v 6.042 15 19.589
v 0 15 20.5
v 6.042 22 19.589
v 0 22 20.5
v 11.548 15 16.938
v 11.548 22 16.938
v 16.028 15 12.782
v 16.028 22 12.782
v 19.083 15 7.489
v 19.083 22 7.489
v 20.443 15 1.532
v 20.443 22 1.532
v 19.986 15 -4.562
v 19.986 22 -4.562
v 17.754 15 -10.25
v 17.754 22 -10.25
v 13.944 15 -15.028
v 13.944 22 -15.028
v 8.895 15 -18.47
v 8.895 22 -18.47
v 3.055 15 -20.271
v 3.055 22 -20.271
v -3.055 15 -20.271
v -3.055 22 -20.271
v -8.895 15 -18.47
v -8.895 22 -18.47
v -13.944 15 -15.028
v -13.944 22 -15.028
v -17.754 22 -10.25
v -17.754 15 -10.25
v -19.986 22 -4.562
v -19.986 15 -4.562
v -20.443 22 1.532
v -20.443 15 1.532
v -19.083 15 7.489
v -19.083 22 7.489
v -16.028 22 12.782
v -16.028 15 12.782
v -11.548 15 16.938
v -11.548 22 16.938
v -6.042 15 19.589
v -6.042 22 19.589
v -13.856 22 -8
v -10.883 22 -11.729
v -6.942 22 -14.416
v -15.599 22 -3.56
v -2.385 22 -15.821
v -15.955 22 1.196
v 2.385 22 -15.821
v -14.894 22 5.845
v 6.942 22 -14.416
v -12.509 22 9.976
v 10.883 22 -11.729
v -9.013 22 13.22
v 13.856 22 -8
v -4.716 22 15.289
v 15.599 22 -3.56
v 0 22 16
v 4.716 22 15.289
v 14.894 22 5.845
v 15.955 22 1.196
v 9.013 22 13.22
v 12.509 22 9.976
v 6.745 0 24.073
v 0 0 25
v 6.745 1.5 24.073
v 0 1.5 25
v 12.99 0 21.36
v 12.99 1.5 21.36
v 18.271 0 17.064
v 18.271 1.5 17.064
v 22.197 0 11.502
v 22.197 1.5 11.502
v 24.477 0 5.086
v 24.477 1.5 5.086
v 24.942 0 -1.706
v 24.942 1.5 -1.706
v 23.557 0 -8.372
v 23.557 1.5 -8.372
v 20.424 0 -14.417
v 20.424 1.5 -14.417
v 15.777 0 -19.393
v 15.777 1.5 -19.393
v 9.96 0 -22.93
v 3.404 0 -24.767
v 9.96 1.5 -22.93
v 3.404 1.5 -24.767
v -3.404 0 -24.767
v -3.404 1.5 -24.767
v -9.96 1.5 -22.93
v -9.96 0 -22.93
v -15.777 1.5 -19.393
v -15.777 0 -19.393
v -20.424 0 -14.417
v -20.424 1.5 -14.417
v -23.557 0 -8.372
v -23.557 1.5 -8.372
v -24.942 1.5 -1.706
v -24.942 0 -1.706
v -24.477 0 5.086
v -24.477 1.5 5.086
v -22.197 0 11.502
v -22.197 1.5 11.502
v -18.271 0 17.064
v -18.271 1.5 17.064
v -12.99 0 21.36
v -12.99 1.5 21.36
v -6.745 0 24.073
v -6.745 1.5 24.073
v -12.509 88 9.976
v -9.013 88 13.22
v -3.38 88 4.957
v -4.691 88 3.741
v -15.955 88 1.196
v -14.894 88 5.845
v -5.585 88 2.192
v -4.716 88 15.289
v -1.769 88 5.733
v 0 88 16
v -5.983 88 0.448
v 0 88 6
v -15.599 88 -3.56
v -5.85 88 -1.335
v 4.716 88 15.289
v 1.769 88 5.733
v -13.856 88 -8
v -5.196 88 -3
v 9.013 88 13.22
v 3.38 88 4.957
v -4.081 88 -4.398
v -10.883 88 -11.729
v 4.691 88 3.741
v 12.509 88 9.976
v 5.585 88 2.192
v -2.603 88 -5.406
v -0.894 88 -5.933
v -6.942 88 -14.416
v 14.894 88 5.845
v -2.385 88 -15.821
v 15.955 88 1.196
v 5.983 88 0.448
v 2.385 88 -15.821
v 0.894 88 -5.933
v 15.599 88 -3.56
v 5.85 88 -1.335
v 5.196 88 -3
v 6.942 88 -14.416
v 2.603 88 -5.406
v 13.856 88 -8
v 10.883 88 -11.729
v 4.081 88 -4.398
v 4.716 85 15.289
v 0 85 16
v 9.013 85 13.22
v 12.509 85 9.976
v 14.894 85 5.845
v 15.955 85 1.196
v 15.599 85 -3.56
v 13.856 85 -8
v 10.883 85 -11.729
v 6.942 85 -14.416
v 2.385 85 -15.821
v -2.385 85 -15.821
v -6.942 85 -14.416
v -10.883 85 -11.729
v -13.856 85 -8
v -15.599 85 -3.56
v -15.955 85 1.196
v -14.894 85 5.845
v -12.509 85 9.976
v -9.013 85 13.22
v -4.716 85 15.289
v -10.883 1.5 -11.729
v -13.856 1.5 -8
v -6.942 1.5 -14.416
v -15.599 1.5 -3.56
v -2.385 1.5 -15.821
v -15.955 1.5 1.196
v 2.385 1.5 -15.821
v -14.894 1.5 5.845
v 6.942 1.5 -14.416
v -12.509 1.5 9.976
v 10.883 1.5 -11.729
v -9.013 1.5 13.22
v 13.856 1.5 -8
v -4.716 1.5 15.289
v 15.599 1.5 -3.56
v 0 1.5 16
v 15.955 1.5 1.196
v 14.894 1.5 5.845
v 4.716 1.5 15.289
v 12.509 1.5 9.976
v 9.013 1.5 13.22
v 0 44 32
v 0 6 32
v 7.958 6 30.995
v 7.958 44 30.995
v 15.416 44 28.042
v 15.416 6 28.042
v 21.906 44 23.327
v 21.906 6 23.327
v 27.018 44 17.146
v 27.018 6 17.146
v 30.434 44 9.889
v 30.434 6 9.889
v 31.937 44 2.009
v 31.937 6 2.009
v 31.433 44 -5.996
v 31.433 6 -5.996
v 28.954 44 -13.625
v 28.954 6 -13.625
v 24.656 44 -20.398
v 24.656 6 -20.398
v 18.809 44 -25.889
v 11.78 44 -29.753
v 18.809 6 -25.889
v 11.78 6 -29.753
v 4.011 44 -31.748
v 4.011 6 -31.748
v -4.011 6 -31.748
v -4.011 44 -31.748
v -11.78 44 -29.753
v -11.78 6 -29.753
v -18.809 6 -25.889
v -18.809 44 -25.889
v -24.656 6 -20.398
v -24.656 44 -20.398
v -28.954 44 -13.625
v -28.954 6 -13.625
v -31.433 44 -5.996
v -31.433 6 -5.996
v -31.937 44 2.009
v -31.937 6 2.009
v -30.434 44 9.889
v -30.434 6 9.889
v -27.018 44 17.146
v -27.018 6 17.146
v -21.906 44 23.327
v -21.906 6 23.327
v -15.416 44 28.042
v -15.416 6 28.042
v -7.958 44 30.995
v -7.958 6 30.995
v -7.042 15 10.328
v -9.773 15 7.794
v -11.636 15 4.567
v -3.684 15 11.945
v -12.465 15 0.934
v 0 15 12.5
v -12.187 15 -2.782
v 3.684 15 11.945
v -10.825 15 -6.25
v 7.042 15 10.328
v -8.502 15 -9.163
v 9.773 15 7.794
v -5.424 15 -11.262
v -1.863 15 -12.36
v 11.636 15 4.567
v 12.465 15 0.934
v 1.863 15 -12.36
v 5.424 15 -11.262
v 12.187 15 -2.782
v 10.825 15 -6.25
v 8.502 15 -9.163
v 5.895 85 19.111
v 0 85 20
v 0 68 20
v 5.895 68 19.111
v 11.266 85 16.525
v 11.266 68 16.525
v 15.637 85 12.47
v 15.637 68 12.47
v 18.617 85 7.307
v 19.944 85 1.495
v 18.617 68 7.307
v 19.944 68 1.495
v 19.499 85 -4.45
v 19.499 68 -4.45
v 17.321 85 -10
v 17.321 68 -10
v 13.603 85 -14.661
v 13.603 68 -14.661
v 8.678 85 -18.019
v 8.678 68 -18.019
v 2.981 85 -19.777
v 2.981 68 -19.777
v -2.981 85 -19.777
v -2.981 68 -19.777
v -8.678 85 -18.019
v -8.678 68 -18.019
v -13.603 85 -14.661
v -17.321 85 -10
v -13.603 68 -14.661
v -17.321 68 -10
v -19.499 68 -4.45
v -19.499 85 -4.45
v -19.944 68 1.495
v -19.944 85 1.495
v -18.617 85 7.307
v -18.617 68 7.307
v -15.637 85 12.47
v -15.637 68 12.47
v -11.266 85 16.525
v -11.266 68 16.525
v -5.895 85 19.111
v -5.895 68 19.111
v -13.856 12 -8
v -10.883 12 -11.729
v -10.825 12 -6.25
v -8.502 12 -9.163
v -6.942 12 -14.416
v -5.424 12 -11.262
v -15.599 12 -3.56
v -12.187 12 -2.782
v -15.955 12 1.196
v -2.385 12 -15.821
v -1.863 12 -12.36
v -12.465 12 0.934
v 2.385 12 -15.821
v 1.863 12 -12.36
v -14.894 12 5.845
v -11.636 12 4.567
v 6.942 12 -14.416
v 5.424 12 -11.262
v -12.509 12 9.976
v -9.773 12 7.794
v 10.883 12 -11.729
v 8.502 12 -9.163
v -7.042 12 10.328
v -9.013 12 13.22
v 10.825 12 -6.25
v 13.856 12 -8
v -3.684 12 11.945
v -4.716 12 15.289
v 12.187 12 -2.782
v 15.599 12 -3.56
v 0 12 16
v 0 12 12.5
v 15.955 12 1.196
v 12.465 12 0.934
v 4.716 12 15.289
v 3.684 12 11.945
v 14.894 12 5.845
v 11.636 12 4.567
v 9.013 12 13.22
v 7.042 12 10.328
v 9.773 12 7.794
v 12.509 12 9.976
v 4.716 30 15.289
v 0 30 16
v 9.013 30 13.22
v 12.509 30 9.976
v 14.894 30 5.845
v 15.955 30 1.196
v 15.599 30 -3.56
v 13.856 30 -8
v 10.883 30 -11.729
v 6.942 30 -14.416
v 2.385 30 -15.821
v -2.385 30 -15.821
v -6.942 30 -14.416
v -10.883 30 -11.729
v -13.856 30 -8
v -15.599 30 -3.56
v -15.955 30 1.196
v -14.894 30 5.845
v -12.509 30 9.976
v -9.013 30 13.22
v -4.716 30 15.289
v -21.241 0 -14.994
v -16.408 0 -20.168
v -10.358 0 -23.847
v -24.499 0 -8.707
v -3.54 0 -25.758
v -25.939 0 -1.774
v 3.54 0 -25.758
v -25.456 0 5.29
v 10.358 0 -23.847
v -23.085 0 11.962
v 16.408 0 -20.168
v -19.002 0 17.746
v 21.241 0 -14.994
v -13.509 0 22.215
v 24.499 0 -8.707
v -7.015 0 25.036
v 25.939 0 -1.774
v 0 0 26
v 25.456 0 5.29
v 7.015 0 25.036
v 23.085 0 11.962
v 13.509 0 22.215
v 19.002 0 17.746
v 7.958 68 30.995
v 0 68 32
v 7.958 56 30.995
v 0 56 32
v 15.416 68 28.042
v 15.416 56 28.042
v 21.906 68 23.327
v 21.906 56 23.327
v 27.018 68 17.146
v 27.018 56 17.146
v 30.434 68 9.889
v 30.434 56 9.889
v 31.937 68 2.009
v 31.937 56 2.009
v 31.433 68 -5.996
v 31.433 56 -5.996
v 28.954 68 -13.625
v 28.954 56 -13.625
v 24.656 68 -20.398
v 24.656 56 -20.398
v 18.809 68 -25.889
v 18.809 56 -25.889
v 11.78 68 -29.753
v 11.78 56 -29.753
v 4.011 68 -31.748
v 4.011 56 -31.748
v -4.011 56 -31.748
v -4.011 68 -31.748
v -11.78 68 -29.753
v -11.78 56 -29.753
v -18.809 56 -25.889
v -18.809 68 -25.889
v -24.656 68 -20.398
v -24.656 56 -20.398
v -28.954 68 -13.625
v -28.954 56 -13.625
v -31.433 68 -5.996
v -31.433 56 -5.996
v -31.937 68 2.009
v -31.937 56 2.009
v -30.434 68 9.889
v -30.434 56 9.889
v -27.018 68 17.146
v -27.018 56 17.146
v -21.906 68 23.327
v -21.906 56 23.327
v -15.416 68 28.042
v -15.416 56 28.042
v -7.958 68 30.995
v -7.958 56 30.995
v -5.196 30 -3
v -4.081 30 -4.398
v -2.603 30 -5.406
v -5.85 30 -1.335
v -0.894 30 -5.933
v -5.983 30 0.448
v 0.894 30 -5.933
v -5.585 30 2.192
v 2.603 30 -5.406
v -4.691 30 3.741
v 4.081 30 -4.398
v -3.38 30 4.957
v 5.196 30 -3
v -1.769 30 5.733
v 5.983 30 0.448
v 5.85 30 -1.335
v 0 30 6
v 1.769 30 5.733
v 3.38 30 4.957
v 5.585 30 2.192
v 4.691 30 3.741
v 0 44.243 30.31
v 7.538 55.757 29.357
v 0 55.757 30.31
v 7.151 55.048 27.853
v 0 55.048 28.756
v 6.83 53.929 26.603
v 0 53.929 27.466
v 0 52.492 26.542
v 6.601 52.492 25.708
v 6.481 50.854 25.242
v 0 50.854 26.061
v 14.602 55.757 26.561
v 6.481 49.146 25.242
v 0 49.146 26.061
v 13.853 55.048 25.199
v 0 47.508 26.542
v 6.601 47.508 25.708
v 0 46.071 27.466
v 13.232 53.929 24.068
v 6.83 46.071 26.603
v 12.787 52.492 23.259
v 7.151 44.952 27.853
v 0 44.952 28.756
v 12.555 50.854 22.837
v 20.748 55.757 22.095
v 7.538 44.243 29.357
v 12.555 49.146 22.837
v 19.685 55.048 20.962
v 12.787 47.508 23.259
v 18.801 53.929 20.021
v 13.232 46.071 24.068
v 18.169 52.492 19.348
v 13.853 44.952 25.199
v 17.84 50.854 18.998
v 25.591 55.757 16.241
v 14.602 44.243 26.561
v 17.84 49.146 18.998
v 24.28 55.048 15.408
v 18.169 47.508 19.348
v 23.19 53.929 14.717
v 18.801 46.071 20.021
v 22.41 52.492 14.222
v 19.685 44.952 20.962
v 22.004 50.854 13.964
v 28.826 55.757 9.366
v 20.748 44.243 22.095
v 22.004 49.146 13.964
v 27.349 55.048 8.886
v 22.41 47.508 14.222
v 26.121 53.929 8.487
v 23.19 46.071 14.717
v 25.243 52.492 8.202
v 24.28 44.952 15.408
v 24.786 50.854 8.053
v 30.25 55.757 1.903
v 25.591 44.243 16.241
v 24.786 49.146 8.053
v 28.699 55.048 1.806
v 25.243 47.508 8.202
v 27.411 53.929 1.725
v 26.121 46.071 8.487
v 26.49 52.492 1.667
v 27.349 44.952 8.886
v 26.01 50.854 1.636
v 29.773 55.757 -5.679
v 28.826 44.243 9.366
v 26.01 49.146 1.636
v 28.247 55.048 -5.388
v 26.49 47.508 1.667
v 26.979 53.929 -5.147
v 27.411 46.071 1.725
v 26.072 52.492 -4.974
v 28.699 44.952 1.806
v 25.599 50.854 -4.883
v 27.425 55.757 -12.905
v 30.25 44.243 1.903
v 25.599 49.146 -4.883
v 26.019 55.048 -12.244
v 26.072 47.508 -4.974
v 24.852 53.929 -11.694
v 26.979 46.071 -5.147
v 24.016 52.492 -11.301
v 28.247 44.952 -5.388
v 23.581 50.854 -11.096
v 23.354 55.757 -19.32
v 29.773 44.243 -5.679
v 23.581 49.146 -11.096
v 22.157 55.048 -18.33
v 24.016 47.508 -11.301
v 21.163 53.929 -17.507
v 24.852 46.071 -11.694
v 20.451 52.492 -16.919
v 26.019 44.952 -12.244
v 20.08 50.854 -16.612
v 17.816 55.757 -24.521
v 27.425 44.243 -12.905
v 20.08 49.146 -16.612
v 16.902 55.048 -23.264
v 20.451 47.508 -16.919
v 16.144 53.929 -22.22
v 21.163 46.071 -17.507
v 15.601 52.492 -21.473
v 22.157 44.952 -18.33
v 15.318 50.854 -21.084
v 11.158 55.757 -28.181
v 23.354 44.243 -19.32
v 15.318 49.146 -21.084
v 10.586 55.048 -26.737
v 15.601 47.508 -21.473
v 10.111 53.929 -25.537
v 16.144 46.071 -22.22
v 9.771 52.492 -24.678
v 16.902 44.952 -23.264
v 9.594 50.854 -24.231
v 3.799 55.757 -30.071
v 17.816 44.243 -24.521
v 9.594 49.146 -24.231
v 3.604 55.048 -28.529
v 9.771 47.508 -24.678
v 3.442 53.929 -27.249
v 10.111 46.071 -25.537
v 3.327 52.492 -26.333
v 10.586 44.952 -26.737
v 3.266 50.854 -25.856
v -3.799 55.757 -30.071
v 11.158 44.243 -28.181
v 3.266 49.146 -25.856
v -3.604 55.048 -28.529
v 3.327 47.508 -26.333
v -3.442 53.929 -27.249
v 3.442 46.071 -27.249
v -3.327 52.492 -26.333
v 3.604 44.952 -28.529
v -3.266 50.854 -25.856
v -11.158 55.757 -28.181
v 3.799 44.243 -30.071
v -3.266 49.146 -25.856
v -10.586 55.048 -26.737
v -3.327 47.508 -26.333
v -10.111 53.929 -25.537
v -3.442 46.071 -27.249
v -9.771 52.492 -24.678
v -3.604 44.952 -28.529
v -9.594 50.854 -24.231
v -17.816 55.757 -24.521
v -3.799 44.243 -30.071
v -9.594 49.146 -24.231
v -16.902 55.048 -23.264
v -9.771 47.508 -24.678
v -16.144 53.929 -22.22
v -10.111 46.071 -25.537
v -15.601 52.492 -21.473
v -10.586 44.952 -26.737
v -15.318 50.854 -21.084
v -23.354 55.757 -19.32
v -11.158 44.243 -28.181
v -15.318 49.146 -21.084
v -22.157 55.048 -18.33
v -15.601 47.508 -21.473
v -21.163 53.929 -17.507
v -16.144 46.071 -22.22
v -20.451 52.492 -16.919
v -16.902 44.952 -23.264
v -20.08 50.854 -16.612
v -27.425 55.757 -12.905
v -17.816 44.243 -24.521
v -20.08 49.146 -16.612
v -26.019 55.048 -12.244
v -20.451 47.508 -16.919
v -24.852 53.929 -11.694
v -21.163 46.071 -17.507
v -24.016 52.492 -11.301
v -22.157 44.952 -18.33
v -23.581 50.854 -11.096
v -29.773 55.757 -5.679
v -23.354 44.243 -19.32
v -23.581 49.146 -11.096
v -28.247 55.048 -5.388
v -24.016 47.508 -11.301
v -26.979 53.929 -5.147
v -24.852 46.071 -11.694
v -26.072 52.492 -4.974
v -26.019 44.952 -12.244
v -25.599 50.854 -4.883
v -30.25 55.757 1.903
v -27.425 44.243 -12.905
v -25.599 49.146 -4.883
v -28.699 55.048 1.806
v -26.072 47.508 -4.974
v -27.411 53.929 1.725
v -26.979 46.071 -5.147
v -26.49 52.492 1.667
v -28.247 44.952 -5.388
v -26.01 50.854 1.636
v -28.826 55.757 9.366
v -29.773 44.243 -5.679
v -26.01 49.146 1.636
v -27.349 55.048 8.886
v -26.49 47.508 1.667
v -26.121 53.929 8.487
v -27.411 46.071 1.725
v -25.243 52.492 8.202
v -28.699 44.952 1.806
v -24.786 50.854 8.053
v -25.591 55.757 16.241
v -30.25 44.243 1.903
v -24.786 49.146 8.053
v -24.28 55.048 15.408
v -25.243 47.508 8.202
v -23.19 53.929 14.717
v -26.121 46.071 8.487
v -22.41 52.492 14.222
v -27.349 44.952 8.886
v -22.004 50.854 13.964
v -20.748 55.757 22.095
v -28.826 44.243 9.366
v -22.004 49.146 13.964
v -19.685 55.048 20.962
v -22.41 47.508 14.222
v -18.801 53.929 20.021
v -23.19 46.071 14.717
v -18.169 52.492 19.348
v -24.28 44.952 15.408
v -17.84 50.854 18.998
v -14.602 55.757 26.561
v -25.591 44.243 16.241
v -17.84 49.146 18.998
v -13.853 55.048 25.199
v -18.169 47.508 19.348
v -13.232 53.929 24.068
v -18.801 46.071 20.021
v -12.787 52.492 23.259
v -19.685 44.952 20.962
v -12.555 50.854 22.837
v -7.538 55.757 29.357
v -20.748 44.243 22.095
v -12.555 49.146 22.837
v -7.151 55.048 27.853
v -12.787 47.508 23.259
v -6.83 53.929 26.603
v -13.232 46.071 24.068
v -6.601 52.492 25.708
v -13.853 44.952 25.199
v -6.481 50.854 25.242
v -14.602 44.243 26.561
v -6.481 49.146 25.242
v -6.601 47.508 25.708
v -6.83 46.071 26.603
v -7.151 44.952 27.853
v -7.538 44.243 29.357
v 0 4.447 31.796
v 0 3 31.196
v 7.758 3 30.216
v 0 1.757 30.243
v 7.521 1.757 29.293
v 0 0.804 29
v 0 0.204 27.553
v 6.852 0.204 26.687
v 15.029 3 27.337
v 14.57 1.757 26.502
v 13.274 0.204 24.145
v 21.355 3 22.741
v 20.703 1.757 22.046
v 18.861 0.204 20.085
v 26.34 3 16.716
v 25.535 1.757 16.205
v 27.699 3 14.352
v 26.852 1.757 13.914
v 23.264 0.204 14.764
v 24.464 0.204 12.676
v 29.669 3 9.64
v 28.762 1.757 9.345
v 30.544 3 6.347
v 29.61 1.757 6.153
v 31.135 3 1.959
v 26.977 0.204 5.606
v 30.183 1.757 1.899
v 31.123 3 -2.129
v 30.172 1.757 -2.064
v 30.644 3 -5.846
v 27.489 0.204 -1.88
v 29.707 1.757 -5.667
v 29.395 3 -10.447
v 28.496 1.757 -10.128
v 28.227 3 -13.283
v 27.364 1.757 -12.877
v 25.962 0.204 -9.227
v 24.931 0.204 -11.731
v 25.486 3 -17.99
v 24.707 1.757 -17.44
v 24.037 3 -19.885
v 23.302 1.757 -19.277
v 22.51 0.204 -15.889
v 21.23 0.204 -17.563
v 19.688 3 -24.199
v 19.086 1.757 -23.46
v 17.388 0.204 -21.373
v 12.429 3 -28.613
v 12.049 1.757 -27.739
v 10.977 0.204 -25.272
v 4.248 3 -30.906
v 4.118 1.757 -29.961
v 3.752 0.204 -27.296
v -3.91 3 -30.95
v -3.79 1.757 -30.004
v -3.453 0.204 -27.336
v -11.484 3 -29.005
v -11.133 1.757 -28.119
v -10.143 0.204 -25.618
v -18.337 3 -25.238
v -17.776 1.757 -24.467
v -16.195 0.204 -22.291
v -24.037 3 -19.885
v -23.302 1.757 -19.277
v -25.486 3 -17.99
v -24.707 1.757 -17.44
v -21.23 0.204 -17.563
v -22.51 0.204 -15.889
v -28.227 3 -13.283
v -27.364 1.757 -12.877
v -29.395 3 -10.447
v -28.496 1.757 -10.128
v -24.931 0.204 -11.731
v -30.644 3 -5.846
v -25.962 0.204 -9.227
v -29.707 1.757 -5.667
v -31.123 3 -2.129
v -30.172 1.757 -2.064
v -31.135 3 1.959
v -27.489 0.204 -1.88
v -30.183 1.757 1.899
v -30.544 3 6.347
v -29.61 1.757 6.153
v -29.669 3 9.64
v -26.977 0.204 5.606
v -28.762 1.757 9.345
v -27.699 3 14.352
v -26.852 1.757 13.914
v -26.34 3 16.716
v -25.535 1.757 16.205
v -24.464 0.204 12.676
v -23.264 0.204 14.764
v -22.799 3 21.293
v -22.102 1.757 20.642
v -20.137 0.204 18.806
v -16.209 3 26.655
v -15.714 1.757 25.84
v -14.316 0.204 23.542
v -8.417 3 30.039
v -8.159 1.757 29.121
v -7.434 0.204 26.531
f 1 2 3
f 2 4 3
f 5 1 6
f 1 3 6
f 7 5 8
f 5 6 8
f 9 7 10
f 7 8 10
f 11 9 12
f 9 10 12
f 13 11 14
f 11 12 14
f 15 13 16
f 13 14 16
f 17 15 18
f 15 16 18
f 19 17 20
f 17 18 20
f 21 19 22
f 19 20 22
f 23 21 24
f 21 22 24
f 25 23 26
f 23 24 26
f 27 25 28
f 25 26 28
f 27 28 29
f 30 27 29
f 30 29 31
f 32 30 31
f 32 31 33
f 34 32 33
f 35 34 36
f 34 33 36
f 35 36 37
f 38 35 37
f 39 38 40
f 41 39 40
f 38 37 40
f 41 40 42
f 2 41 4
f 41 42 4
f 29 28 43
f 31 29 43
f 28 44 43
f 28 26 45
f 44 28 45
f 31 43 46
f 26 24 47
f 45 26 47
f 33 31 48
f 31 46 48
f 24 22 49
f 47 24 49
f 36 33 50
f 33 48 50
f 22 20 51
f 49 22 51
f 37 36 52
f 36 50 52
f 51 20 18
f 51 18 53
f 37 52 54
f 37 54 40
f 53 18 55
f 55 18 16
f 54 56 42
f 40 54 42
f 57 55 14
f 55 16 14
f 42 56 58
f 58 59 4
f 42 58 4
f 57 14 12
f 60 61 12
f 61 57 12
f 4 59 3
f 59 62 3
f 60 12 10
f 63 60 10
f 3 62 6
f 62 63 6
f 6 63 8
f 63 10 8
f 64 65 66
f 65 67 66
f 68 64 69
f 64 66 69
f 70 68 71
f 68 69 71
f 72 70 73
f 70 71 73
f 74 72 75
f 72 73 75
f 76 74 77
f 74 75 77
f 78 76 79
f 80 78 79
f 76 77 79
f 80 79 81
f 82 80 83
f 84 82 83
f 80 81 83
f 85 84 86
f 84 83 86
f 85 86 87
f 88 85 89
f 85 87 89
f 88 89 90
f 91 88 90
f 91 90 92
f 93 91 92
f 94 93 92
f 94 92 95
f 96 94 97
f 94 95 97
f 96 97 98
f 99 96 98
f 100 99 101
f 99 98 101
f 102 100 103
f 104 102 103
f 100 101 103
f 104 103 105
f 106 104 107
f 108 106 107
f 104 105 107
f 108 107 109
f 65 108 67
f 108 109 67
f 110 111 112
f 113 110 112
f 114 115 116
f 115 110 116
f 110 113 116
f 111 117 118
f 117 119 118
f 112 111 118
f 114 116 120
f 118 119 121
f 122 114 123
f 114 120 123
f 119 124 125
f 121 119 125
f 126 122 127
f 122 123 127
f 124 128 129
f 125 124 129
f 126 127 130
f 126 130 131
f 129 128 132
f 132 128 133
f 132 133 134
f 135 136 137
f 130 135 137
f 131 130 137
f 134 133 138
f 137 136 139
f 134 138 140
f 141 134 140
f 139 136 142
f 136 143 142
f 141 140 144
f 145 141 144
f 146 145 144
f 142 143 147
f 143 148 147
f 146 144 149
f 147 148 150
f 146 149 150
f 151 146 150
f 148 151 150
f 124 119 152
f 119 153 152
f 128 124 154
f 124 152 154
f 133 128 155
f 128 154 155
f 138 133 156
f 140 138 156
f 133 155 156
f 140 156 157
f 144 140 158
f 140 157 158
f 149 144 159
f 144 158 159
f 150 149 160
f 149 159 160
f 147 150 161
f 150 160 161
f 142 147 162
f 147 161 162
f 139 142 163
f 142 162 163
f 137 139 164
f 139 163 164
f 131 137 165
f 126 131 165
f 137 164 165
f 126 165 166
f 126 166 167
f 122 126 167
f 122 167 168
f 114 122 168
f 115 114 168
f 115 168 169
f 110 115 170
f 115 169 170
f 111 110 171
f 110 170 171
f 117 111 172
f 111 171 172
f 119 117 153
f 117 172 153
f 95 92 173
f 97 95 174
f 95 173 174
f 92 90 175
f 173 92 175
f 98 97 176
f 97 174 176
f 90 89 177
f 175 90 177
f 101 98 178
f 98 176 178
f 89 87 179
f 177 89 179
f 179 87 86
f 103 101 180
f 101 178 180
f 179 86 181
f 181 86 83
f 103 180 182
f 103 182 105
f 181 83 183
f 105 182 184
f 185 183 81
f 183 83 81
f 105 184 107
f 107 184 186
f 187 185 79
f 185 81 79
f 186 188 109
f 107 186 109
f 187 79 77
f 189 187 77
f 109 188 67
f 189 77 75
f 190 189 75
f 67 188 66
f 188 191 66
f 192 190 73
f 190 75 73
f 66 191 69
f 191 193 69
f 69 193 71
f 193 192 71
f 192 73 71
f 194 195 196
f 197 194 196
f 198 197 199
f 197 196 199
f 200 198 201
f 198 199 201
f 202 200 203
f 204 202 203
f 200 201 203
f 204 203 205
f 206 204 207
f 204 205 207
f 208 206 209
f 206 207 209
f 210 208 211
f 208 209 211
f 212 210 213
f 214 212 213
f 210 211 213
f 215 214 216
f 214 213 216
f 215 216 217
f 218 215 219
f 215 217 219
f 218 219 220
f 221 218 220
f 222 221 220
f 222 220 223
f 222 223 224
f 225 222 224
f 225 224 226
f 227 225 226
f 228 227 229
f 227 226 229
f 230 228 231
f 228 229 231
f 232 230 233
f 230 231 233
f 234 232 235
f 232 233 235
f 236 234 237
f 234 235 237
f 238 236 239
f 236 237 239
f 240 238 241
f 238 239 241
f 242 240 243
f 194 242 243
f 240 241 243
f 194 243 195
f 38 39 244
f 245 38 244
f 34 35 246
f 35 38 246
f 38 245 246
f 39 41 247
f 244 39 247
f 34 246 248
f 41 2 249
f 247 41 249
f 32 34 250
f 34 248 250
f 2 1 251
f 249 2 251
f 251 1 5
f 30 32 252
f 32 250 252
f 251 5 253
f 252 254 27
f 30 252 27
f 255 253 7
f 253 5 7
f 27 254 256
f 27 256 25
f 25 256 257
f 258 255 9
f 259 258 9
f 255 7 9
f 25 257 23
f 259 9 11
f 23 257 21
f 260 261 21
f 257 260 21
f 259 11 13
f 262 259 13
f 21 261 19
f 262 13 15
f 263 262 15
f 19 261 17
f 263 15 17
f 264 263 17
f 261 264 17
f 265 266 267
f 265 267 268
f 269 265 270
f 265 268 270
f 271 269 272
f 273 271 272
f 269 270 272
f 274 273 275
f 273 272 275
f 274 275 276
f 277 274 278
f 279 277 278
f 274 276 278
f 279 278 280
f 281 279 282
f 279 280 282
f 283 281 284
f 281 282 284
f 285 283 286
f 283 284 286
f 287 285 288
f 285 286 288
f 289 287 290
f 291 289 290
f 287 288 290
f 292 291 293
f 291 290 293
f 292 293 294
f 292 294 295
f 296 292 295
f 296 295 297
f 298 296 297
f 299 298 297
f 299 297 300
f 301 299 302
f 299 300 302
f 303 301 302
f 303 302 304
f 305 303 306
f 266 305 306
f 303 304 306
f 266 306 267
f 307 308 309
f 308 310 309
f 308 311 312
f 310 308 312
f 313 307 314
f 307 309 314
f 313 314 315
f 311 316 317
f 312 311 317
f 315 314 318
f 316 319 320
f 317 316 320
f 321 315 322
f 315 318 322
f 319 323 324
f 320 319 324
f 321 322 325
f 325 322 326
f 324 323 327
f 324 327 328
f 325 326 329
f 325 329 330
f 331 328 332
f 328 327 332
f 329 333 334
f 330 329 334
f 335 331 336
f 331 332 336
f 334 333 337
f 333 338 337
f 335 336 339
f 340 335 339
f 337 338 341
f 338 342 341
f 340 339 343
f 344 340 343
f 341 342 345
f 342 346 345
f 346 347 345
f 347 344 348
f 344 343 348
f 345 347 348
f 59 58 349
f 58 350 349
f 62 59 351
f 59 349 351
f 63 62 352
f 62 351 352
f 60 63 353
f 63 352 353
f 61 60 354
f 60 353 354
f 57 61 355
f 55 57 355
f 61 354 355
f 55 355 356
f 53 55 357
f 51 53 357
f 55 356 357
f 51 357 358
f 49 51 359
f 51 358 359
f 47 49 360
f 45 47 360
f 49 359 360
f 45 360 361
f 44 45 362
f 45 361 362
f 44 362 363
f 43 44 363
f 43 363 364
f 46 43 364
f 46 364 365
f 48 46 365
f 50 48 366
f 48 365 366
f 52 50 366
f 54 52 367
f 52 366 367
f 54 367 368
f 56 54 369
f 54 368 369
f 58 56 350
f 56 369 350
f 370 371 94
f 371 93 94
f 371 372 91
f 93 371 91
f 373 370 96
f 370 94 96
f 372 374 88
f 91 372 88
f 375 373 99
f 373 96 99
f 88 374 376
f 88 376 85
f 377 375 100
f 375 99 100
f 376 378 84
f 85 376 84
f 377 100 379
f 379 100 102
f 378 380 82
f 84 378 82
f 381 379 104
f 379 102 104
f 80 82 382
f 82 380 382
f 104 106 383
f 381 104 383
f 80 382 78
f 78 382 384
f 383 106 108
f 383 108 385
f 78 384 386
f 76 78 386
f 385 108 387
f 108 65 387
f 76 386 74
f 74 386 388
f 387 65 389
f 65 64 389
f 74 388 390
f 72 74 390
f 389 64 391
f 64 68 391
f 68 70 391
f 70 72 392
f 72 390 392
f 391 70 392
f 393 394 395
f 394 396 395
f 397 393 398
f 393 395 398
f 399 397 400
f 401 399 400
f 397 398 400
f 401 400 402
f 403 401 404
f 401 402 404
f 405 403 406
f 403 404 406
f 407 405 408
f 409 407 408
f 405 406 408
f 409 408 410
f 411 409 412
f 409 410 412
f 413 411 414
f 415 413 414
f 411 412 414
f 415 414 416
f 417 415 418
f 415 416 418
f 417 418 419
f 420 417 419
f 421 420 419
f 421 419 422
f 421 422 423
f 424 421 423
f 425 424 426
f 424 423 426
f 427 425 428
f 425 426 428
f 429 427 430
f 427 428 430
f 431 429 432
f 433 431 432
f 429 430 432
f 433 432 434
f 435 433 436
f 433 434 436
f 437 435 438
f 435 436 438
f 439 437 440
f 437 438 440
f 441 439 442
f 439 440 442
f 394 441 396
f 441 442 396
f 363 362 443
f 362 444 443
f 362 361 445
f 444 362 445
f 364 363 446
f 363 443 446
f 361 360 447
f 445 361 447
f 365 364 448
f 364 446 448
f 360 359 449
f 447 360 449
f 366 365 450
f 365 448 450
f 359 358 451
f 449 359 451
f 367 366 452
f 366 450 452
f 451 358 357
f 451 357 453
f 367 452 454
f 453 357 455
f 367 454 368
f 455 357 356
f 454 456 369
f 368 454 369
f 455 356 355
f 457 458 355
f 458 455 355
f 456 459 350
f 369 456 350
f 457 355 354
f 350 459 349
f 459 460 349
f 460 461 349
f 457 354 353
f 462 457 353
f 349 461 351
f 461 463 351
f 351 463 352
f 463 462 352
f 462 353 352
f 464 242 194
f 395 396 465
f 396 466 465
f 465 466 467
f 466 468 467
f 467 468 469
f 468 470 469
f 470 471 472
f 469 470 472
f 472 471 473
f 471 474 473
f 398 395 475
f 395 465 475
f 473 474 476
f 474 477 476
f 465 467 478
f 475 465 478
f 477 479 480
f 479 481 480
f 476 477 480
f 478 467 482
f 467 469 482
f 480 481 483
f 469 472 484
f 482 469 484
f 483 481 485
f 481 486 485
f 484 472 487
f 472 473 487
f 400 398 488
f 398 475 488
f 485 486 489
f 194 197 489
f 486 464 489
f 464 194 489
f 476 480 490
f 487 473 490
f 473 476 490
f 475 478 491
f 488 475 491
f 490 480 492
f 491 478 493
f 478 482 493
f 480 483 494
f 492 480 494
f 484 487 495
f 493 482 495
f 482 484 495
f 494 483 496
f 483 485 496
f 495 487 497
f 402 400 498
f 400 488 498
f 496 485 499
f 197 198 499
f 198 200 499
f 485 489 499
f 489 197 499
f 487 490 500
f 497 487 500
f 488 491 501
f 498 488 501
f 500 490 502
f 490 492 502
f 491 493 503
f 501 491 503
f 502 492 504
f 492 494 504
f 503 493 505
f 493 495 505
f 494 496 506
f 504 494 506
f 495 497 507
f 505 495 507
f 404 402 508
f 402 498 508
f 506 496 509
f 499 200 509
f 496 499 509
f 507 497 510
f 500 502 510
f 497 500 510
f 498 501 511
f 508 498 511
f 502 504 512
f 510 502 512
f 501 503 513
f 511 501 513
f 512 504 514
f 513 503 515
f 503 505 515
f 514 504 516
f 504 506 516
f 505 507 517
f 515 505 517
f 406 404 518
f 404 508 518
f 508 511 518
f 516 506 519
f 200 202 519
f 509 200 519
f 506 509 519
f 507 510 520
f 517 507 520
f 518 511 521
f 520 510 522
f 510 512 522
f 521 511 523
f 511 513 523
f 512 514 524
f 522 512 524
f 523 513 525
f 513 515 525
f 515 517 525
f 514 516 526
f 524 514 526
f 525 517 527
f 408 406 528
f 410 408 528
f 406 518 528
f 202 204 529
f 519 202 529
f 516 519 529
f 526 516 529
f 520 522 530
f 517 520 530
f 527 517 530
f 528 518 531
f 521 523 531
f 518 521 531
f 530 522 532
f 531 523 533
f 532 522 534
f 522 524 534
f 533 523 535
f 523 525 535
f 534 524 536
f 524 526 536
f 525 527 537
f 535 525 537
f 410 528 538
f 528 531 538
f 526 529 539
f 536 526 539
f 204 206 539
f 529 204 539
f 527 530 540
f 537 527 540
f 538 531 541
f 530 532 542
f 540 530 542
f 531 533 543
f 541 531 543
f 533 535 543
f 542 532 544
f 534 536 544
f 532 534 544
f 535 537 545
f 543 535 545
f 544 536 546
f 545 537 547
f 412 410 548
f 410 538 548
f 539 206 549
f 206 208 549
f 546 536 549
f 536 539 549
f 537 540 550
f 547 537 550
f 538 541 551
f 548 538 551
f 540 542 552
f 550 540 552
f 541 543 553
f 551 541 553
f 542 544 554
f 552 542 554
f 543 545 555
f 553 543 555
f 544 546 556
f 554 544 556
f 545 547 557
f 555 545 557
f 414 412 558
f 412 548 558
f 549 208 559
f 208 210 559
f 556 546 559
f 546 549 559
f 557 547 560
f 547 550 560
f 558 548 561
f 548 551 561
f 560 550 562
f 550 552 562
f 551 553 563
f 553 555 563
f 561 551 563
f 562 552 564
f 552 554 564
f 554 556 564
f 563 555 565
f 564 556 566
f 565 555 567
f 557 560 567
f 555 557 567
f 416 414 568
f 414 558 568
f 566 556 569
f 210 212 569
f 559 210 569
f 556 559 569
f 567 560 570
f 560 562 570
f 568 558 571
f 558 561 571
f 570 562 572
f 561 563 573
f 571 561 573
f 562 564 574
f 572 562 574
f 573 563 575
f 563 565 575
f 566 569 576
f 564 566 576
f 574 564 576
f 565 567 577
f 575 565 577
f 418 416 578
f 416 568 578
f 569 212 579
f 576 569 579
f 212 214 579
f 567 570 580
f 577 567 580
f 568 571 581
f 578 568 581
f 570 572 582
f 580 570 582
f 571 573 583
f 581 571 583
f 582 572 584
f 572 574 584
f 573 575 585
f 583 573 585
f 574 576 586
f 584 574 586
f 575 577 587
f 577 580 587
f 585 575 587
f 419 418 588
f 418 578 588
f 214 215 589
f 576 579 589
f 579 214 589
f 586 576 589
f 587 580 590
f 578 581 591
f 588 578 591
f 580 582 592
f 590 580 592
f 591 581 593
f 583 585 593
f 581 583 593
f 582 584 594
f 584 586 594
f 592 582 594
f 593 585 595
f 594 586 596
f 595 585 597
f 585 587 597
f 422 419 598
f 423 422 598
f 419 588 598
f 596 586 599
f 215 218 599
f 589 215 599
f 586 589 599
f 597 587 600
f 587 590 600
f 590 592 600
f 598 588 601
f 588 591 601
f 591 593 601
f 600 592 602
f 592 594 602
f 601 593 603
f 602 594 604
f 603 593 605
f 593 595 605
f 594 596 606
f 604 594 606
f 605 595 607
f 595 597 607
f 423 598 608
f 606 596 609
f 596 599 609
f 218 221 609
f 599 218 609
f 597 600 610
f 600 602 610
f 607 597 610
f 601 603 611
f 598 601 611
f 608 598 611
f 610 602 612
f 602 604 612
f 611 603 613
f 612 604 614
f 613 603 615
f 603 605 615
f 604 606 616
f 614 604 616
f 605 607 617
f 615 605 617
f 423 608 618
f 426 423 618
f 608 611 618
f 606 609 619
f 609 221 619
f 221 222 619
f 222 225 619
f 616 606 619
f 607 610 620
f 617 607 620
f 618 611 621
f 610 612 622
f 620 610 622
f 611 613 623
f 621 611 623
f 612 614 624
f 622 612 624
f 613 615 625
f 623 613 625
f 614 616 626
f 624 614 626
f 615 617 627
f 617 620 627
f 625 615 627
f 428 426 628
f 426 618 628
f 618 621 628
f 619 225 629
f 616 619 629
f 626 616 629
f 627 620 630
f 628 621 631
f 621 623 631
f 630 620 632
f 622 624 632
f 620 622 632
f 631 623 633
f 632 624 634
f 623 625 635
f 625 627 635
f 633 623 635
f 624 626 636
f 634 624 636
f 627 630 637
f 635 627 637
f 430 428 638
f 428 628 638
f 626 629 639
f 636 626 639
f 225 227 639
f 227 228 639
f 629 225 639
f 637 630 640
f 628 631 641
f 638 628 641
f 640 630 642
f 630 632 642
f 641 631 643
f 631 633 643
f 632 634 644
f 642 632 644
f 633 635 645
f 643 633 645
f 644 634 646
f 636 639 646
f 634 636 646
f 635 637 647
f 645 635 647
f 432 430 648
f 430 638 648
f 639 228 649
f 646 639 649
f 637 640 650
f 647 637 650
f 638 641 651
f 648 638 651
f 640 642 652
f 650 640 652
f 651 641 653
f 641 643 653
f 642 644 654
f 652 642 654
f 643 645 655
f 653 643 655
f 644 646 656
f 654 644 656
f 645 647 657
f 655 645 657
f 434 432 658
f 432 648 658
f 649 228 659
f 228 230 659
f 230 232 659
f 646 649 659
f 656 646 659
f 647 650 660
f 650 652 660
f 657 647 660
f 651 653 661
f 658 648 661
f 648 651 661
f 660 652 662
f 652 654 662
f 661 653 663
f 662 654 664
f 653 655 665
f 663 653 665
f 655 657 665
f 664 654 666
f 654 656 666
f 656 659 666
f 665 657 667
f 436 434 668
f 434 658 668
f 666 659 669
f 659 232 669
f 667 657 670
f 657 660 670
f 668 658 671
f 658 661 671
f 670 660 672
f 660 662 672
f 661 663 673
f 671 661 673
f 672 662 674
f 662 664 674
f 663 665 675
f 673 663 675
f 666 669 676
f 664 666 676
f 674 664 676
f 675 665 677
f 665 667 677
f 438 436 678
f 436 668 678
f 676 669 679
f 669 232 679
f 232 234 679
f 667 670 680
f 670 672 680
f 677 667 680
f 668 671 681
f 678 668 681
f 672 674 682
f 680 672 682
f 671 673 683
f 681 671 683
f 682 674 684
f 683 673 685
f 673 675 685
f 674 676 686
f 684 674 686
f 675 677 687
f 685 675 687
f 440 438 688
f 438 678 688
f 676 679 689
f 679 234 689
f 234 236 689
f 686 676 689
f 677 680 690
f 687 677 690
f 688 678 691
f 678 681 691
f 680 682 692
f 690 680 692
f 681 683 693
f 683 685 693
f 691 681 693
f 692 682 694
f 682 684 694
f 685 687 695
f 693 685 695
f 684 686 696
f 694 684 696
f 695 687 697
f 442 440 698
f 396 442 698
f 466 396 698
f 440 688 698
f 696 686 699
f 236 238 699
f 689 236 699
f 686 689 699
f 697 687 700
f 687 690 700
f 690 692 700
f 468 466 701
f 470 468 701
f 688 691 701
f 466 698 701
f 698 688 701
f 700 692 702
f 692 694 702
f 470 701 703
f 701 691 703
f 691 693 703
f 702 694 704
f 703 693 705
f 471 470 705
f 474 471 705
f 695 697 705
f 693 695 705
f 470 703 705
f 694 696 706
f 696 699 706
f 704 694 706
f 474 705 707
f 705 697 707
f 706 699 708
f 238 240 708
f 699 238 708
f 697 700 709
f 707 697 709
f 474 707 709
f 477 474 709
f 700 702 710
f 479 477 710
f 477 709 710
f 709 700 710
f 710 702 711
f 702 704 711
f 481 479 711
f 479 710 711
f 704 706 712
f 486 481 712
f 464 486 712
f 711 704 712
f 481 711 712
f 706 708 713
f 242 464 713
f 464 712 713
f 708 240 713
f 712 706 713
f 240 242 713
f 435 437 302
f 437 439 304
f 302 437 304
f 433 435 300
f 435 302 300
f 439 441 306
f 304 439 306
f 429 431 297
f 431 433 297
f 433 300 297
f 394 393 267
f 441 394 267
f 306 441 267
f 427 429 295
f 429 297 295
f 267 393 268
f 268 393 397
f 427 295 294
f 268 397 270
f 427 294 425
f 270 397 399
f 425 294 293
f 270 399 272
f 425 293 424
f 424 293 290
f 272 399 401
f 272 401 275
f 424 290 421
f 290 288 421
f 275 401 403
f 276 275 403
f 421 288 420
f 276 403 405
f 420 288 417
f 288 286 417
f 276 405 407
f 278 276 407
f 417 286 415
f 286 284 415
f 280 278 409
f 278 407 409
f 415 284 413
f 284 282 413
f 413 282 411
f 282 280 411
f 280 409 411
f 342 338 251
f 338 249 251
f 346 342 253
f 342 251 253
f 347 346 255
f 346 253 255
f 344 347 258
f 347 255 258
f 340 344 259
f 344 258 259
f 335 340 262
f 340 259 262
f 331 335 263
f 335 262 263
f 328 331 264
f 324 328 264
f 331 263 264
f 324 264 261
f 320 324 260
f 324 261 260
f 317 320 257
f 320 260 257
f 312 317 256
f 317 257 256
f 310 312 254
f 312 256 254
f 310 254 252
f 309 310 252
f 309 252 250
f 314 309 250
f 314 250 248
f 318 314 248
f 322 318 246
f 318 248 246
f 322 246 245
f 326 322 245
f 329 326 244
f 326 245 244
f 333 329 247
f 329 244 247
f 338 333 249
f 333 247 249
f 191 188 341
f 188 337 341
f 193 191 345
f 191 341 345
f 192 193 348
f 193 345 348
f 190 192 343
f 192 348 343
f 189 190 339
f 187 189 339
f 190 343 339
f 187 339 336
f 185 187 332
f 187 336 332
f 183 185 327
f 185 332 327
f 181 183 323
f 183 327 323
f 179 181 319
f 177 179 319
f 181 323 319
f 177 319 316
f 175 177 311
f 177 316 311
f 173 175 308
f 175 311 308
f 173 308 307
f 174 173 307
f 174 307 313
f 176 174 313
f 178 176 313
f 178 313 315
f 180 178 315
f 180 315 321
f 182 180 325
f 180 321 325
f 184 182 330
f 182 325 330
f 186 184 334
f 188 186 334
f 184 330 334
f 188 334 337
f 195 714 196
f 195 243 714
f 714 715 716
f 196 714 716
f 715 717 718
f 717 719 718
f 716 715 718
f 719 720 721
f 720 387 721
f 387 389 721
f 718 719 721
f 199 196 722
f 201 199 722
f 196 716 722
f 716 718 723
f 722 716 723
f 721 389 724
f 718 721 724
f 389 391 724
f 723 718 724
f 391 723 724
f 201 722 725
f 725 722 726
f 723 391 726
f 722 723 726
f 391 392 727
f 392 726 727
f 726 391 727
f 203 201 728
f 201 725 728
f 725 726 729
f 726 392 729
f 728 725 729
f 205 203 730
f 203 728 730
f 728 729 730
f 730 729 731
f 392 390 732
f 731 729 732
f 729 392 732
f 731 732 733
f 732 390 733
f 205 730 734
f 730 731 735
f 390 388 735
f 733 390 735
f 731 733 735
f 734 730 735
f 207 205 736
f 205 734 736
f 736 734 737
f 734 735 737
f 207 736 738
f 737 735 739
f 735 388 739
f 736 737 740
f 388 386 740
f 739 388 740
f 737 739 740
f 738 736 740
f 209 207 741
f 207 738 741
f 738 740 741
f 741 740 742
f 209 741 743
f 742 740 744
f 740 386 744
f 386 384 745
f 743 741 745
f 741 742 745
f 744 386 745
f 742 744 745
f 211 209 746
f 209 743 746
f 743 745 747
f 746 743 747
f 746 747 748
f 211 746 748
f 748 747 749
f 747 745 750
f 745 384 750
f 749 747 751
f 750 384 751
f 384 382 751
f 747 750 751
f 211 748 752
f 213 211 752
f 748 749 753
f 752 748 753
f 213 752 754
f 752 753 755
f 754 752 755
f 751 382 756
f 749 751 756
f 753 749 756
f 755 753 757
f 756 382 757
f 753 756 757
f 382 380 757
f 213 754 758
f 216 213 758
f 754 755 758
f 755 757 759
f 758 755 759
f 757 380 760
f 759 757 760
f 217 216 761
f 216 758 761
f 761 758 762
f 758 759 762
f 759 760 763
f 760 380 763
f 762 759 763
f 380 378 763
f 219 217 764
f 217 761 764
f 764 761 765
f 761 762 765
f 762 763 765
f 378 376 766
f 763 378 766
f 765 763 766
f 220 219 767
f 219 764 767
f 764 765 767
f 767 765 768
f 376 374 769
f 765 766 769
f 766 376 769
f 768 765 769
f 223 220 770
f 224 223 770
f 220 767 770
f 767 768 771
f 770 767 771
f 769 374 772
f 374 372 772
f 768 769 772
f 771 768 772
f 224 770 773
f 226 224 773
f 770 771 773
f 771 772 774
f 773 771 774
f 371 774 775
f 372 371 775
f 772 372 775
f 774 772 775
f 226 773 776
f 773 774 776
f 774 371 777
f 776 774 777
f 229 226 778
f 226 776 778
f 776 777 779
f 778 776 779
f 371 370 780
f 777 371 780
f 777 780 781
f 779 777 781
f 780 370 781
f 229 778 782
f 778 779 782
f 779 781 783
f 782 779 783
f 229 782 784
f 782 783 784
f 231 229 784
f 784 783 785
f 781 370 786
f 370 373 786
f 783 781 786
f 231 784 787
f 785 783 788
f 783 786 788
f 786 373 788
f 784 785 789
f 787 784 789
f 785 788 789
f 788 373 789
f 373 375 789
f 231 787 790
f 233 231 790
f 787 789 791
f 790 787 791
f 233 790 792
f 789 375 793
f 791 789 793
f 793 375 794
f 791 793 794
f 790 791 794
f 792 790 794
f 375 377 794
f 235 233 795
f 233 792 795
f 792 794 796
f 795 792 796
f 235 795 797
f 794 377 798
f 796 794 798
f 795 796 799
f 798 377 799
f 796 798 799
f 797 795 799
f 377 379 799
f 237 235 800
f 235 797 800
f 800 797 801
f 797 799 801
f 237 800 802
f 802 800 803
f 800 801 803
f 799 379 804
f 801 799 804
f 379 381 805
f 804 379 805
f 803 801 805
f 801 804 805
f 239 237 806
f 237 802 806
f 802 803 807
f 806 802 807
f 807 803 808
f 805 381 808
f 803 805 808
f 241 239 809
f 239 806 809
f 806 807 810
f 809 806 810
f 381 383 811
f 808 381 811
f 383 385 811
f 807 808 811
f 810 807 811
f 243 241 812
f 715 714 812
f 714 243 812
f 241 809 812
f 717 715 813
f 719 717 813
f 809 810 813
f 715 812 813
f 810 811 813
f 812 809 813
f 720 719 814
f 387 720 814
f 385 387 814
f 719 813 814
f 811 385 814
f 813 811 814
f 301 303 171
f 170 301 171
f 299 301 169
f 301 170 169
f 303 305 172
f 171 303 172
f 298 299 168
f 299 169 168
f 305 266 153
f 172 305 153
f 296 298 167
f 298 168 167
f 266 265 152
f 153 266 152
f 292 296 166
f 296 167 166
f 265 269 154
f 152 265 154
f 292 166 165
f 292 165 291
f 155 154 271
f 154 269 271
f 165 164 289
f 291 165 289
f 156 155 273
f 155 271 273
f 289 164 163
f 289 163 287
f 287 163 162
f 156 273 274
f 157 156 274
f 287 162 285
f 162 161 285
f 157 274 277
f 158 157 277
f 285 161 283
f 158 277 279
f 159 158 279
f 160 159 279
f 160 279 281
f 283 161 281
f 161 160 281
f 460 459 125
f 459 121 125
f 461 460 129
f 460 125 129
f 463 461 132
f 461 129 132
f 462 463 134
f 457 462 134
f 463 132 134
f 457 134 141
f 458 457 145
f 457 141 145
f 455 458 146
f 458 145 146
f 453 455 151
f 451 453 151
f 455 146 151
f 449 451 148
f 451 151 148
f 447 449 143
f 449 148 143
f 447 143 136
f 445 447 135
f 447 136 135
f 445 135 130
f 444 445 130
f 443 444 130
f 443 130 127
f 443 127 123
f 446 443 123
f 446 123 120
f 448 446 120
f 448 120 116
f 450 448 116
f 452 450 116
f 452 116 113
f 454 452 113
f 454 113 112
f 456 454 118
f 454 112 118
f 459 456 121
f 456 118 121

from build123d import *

# Parameters (mm, degrees)
F2_R = 6


with BuildPart() as f1:
    # F0 (on Right) → F1 (revolve)
    with BuildSketch(Plane.YZ):
        with BuildLine():
            Line((30, 6), (88, 6))
            Line((88, 6), (88, 16))
            Line((88, 16), (85, 16))
            Line((85, 16), (85, 20))
            Line((85, 20), (68, 20))
            Line((68, 20), (68, 32))
            Line((68, 32), (56, 32))
            ThreePointArc((56, 32), (50, 26), (44, 32))
            Line((44, 32), (0, 32))
            Line((0, 32), (0, 25))
            Line((0, 25), (1.5, 25))
            Line((1.5, 25), (1.5, 16))
            Line((1.5, 16), (12, 16))
            Line((12, 16), (12, 12.5))
            Line((12, 12.5), (15, 12.5))
            Line((15, 12.5), (15, 20.5))
            Line((15, 20.5), (22, 20.5))
            Line((22, 20.5), (22, 16))
            Line((22, 16), (30, 16))
            Line((30, 16), (30, 6))
        make_face()
    revolve(axis=Axis((0, 49.247101, 0), (0, 1, 0)))

    # F2
    f2_edges = [f1.edges().sort_by_distance(p)[0] for p in [
        (0, 0, -32),
    ]]
    fillet(f2_edges, radius=F2_R)


solid = f1.part
